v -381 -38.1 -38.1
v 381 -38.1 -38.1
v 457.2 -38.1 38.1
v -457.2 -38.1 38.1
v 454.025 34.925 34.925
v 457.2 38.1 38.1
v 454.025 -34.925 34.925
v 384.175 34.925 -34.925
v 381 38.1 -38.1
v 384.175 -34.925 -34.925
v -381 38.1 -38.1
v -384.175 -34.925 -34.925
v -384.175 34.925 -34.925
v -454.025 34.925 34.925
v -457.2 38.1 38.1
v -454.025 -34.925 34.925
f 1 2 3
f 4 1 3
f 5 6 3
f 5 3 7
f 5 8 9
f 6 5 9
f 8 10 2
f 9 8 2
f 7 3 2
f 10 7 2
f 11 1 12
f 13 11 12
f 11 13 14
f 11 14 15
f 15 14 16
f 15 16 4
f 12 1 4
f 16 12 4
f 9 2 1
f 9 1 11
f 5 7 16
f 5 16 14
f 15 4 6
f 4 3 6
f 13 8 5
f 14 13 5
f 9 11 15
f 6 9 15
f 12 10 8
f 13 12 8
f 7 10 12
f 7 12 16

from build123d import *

# Parameters (mm, degrees)
F0_W          = 76.2
F0_H          = 76.2
F0_W_2        = 69.85
F0_H_2        = 69.85
F1_DEPTH      = 457.2
F1_DEPTH_BACK = 457.2
F3_DEPTH      = 76.201


with BuildPart() as f1:
    # F0 (on Right) → F1 (new body, two sides)
    with BuildSketch(Plane.YZ) as f1_sk:
        Rectangle(F0_W, F0_H)
        Rectangle(F0_W_2, F0_H_2, mode=Mode.SUBTRACT)
    extrude(amount=F1_DEPTH)
    extrude(f1_sk.sketch, amount=-F1_DEPTH_BACK)

    # F2 (on face) → F3 (cut, through all)
    with BuildSketch(Plane.XZ.offset(38.1)):
        Polygon((-381, -38.1), (-457.2, 38.1), (-457.2, -38.1), align=None)
        Polygon((457.2, -38.1), (457.2, 38.1), (381, -38.1), align=None)
    extrude(amount=-F3_DEPTH, mode=Mode.SUBTRACT)


solid = f1.part
